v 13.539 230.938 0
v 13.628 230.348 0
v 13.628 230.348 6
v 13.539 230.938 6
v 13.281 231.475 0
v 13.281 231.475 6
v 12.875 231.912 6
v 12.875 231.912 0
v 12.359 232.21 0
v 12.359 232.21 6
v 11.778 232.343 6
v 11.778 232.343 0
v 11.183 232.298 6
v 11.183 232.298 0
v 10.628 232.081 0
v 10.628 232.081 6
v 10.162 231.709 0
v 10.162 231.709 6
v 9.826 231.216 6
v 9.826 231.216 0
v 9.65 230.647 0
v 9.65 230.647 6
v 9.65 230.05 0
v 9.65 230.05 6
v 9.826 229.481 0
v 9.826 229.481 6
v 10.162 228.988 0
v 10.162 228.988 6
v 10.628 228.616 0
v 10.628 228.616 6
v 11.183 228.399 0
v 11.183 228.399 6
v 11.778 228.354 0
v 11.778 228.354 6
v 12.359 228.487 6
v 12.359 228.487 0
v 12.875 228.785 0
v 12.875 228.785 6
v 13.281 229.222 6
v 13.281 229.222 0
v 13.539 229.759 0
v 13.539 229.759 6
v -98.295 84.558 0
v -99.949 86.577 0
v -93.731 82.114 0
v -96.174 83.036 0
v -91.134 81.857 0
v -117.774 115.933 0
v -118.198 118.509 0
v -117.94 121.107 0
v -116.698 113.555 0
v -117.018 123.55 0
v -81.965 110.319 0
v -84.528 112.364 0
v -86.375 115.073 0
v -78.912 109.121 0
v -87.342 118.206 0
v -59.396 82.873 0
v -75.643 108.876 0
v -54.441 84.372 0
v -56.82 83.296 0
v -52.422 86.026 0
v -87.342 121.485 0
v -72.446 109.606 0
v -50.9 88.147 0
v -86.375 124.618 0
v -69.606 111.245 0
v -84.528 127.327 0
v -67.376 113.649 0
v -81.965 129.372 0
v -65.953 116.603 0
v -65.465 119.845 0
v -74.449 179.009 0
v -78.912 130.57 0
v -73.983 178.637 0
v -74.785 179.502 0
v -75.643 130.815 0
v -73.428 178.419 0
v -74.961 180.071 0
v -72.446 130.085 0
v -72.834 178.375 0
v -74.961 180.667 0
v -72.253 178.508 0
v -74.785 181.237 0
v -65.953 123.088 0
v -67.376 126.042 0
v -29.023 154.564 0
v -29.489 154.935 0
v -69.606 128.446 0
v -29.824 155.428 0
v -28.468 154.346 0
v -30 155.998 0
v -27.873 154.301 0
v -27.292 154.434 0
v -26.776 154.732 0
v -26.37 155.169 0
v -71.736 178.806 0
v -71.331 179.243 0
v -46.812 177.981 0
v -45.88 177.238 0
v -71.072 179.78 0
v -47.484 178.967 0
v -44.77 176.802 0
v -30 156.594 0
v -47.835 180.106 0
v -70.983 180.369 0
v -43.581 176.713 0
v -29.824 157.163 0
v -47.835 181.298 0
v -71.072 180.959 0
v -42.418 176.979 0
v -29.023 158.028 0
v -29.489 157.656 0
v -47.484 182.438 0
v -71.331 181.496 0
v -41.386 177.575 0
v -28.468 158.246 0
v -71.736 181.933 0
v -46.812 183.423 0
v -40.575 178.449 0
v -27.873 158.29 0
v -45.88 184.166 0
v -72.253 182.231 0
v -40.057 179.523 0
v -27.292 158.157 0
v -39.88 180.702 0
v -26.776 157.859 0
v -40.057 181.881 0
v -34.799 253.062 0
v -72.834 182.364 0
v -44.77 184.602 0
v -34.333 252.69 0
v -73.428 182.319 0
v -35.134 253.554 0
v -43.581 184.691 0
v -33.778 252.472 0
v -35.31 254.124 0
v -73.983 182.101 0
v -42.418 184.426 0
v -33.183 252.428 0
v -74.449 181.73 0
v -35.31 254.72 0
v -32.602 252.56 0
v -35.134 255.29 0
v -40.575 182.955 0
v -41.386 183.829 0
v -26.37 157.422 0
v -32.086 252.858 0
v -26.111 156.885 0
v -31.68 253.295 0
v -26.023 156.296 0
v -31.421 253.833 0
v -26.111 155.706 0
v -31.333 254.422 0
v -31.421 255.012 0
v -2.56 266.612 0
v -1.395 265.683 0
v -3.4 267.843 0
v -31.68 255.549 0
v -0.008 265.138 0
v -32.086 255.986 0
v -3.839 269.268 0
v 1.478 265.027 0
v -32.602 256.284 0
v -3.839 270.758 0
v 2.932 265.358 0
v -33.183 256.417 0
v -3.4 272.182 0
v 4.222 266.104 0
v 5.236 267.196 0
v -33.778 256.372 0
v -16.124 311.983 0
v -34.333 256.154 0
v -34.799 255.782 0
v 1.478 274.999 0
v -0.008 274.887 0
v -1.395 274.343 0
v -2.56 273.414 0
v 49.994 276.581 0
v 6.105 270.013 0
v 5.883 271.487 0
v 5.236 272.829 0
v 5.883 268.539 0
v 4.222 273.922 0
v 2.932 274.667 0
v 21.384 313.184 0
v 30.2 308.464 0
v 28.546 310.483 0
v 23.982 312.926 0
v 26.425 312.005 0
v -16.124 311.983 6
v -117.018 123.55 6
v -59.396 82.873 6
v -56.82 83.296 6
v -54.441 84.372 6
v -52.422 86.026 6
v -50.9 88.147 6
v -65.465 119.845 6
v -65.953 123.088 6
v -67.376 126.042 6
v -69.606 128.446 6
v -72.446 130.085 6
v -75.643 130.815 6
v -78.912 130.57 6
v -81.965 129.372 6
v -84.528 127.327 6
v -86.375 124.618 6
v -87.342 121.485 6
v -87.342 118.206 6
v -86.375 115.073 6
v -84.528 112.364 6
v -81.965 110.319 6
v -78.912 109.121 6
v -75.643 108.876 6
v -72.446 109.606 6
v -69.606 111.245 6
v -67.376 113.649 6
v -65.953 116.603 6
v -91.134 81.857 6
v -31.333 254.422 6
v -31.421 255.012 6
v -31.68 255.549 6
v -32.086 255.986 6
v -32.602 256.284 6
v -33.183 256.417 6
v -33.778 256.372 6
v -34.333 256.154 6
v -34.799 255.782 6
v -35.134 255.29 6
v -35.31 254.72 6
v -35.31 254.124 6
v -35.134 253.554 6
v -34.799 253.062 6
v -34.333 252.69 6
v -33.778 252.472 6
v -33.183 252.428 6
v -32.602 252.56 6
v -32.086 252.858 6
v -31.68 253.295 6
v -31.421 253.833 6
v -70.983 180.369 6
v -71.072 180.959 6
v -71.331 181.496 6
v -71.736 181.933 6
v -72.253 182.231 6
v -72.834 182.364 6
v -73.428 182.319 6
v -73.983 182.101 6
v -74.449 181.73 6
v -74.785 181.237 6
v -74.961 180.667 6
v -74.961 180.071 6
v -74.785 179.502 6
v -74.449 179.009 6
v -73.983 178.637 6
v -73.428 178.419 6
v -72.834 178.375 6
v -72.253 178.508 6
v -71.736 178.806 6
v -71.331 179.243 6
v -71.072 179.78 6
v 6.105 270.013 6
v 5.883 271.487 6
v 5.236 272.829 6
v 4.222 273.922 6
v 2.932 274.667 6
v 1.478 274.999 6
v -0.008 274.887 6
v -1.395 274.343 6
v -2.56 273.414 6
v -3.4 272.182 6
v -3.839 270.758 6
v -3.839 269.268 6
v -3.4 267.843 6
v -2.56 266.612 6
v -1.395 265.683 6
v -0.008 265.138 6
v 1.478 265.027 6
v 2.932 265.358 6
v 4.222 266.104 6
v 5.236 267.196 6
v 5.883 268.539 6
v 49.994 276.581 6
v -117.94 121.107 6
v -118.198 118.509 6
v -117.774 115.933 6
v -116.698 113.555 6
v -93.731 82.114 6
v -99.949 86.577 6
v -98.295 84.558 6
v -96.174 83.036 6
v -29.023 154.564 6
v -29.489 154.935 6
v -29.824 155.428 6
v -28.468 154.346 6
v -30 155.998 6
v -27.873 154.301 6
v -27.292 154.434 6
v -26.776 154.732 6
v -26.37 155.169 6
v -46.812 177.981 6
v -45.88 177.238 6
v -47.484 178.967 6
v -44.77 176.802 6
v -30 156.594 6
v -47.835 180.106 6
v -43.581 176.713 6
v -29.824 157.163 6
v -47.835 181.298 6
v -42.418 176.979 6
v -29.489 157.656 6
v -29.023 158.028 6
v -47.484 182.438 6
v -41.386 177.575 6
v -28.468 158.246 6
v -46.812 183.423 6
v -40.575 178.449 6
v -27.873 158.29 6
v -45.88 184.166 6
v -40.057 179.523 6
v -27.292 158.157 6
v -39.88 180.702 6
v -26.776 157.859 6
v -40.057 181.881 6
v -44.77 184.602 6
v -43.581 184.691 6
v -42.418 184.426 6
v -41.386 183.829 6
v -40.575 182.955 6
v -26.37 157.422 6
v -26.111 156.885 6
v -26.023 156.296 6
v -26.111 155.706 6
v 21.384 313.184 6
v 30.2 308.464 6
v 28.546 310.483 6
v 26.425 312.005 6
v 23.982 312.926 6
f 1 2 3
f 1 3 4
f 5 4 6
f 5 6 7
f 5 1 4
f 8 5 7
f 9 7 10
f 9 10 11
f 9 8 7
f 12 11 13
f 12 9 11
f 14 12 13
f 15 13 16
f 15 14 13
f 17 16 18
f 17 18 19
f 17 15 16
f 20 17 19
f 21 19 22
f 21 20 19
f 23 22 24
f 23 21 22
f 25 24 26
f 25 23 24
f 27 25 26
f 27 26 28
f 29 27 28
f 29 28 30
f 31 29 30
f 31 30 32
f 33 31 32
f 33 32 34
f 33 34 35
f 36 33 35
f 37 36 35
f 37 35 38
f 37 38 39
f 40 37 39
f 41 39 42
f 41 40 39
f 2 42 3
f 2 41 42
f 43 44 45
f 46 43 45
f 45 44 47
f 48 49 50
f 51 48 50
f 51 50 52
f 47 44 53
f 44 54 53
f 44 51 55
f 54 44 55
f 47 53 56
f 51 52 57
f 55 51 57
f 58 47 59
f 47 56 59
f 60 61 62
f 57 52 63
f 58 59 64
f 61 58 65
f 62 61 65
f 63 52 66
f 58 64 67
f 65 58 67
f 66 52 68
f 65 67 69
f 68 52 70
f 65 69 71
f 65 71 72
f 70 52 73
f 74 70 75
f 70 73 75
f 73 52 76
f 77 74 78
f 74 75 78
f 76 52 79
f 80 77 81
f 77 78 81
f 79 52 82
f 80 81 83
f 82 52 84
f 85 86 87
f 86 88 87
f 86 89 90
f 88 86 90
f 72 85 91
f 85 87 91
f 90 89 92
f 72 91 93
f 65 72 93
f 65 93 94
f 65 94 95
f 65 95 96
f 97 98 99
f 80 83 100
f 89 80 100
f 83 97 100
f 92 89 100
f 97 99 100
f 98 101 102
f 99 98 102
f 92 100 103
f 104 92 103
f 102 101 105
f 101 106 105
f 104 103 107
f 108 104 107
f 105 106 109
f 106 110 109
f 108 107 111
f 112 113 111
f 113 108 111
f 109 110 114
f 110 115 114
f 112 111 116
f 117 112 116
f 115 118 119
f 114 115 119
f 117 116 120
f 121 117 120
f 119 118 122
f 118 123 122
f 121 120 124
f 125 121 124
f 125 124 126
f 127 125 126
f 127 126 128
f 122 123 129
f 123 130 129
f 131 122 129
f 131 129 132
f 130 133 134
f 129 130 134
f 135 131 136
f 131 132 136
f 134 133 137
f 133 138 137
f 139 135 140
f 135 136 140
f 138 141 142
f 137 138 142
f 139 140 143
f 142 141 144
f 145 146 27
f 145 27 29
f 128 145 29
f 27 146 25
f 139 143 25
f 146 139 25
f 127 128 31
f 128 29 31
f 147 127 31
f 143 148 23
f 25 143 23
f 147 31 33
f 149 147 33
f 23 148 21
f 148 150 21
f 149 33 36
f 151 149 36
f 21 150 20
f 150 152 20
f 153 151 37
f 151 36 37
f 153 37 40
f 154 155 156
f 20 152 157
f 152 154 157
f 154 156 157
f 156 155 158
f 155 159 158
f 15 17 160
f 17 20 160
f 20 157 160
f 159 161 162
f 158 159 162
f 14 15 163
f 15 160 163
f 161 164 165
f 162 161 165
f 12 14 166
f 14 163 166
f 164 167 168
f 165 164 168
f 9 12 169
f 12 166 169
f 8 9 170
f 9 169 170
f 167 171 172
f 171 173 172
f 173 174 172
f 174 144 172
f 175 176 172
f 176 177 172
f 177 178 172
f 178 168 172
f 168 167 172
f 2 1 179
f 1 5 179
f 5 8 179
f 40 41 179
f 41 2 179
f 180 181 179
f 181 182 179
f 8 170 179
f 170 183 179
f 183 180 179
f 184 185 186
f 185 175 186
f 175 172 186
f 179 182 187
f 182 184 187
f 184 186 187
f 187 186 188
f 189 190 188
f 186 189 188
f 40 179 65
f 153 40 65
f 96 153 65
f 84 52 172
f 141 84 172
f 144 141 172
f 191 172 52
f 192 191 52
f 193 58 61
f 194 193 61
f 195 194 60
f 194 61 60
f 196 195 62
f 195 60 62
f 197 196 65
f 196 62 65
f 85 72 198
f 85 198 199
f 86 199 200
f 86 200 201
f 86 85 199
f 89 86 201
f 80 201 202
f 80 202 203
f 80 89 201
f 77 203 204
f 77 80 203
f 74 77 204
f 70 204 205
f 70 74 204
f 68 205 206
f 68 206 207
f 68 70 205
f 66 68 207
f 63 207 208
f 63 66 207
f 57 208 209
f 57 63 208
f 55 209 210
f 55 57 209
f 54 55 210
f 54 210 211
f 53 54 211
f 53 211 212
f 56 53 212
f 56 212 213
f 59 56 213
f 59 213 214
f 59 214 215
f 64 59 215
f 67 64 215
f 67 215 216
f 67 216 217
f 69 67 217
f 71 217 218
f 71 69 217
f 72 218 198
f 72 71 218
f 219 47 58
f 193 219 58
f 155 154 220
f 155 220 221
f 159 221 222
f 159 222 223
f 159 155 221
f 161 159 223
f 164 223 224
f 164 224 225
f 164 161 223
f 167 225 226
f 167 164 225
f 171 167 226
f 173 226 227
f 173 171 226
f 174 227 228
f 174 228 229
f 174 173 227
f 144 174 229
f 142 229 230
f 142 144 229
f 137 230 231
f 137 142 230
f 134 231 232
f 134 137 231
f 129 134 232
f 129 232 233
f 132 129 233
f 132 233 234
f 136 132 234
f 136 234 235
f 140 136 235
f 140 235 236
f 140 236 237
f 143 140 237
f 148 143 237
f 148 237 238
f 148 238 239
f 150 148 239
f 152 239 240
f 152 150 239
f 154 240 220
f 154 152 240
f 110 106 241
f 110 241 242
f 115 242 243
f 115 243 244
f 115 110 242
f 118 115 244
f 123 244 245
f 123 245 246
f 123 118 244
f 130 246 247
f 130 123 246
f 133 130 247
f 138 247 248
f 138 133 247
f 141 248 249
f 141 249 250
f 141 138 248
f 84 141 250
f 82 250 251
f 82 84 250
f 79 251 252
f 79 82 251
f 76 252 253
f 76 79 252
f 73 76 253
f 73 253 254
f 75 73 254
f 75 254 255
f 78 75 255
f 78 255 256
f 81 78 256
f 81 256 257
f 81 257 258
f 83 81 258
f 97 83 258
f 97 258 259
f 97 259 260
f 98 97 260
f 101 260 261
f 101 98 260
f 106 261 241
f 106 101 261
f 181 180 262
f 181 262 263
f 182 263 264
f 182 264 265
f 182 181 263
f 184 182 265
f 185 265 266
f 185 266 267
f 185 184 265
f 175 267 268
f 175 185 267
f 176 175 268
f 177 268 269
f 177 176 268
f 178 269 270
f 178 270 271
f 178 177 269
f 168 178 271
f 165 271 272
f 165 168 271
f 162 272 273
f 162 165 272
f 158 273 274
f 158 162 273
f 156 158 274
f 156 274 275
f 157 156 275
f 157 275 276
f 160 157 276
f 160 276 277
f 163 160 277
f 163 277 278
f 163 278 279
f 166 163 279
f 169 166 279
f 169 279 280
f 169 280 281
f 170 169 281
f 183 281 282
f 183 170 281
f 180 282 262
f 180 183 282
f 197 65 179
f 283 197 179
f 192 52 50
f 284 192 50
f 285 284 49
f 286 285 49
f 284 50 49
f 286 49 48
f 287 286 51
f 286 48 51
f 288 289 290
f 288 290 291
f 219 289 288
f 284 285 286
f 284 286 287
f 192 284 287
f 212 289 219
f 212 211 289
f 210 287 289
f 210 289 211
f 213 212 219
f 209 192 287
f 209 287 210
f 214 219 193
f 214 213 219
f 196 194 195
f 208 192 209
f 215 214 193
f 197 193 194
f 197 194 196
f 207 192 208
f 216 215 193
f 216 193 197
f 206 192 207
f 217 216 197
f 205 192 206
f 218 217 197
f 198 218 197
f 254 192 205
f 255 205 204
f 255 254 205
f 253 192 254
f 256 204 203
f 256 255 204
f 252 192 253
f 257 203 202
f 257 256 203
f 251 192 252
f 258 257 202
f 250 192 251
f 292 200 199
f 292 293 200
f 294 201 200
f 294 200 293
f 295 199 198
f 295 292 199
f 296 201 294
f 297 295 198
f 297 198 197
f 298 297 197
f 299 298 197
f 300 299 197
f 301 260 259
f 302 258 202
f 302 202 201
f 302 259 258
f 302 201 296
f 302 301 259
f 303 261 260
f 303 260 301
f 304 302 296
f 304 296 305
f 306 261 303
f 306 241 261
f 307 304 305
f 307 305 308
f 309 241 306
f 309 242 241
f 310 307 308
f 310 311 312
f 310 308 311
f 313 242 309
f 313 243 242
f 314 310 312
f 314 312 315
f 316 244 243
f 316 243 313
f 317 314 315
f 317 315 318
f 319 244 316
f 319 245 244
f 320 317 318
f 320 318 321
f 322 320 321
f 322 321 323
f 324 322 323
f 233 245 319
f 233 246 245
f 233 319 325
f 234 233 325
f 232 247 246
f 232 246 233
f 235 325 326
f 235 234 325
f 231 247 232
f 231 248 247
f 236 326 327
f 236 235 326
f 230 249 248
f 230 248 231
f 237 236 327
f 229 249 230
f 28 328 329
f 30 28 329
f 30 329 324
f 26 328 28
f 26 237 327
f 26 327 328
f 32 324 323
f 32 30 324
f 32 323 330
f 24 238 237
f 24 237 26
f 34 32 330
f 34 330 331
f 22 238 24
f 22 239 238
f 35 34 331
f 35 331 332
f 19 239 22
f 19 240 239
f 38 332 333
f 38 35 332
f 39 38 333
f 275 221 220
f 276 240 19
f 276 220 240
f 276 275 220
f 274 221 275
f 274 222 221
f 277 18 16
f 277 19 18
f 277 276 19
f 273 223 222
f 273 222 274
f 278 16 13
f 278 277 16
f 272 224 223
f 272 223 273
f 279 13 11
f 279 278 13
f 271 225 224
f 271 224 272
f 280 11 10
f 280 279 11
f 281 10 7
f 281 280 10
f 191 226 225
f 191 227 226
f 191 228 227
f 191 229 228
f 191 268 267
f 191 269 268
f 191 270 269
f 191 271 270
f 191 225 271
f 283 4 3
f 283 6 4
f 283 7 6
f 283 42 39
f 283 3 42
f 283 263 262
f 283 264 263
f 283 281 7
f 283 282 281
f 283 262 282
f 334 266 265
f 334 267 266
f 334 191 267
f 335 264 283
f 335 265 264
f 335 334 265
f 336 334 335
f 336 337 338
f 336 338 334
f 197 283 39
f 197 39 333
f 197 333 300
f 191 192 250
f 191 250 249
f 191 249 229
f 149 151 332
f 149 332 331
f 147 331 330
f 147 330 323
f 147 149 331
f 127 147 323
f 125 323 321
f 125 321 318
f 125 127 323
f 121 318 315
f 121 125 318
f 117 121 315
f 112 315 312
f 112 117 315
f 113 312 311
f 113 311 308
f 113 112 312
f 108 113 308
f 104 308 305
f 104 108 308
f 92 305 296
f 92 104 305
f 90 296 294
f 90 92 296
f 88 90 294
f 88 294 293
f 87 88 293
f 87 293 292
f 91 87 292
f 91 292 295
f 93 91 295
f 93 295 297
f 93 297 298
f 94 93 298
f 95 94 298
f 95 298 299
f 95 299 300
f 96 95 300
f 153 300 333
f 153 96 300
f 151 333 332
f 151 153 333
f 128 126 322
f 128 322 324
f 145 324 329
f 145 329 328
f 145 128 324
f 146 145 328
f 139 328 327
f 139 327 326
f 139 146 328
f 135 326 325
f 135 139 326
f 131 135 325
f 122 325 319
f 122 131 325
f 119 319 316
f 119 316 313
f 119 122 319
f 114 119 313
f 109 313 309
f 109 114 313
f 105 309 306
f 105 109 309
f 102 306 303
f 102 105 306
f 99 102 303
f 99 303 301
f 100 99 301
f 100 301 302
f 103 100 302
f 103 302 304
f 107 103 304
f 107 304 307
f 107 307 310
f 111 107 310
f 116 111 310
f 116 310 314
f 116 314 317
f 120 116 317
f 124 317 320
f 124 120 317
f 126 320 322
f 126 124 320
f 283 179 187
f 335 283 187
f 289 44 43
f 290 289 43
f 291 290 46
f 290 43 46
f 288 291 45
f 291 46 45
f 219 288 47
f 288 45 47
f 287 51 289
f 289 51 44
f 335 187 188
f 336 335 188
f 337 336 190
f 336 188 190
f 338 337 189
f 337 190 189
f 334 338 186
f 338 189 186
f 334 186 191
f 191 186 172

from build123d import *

# Parameters (mm, degrees)
SKETCH1_R           = 5
SKETCH1_R_2         = 2
SKETCH1_R_3         = 4
SKETCH1_R_4         = 11
BOSS_EXTRUDE1_DEPTH = 6


with BuildPart() as part:
    # Sketch1 → Boss-Extrude1 (new body)
    with BuildSketch(Plane.XY):
        with BuildLine():
            Line((-91.133667709, 81.856650449), (-59.395664216, 82.872754588))
            ThreePointArc((-59.395664216, 82.872754588), (-54.441095215, 84.371809376), (-50.89983999, 88.147313406))
            Line((-50.89983999, 88.147313406), (49.994476852, 276.580618392))
            Line((49.994476852, 276.580618392), (30.200235156, 308.463550017))
            ThreePointArc((30.200235156, 308.463550017), (26.424731127, 312.004805242), (21.384421113, 313.183870213))
            Line((21.384421113, 313.183870213), (-16.12412847, 311.983019868))
            Line((-16.12412847, 311.983019868), (-117.018445312, 123.549714881))
            ThreePointArc((-117.018445312, 123.549714881), (-118.197510284, 118.509404868), (-116.698455495, 113.554835867))
            Line((-116.698455495, 113.554835867), (-99.949481752, 86.576970646))
            ThreePointArc((-99.949481752, 86.576970646), (-96.173977723, 83.035715421), (-91.133667709, 81.856650449))
        make_face()
        with Locations((1.104829999, 270.012836125)):
            Circle(SKETCH1_R, mode=Mode.SUBTRACT)
        with Locations((-33.33250289, 254.422130449)):
            Circle(SKETCH1_R_2, mode=Mode.SUBTRACT)
        with Locations((11.628148729, 230.348497445)):
            Circle(SKETCH1_R_2, mode=Mode.SUBTRACT)
        with Locations((-28.022540924, 156.295659484)):
            Circle(SKETCH1_R_2, mode=Mode.SUBTRACT)
        with Locations((-43.879665152, 180.702169371)):
            Circle(SKETCH1_R_3, mode=Mode.SUBTRACT)
        with Locations((-72.983192543, 180.369292488)):
            Circle(SKETCH1_R_2, mode=Mode.SUBTRACT)
        with Locations((-76.464627777, 119.845498823)):
            Circle(SKETCH1_R_4, mode=Mode.SUBTRACT)
    extrude(amount=BOSS_EXTRUDE1_DEPTH)


solid = part.part
